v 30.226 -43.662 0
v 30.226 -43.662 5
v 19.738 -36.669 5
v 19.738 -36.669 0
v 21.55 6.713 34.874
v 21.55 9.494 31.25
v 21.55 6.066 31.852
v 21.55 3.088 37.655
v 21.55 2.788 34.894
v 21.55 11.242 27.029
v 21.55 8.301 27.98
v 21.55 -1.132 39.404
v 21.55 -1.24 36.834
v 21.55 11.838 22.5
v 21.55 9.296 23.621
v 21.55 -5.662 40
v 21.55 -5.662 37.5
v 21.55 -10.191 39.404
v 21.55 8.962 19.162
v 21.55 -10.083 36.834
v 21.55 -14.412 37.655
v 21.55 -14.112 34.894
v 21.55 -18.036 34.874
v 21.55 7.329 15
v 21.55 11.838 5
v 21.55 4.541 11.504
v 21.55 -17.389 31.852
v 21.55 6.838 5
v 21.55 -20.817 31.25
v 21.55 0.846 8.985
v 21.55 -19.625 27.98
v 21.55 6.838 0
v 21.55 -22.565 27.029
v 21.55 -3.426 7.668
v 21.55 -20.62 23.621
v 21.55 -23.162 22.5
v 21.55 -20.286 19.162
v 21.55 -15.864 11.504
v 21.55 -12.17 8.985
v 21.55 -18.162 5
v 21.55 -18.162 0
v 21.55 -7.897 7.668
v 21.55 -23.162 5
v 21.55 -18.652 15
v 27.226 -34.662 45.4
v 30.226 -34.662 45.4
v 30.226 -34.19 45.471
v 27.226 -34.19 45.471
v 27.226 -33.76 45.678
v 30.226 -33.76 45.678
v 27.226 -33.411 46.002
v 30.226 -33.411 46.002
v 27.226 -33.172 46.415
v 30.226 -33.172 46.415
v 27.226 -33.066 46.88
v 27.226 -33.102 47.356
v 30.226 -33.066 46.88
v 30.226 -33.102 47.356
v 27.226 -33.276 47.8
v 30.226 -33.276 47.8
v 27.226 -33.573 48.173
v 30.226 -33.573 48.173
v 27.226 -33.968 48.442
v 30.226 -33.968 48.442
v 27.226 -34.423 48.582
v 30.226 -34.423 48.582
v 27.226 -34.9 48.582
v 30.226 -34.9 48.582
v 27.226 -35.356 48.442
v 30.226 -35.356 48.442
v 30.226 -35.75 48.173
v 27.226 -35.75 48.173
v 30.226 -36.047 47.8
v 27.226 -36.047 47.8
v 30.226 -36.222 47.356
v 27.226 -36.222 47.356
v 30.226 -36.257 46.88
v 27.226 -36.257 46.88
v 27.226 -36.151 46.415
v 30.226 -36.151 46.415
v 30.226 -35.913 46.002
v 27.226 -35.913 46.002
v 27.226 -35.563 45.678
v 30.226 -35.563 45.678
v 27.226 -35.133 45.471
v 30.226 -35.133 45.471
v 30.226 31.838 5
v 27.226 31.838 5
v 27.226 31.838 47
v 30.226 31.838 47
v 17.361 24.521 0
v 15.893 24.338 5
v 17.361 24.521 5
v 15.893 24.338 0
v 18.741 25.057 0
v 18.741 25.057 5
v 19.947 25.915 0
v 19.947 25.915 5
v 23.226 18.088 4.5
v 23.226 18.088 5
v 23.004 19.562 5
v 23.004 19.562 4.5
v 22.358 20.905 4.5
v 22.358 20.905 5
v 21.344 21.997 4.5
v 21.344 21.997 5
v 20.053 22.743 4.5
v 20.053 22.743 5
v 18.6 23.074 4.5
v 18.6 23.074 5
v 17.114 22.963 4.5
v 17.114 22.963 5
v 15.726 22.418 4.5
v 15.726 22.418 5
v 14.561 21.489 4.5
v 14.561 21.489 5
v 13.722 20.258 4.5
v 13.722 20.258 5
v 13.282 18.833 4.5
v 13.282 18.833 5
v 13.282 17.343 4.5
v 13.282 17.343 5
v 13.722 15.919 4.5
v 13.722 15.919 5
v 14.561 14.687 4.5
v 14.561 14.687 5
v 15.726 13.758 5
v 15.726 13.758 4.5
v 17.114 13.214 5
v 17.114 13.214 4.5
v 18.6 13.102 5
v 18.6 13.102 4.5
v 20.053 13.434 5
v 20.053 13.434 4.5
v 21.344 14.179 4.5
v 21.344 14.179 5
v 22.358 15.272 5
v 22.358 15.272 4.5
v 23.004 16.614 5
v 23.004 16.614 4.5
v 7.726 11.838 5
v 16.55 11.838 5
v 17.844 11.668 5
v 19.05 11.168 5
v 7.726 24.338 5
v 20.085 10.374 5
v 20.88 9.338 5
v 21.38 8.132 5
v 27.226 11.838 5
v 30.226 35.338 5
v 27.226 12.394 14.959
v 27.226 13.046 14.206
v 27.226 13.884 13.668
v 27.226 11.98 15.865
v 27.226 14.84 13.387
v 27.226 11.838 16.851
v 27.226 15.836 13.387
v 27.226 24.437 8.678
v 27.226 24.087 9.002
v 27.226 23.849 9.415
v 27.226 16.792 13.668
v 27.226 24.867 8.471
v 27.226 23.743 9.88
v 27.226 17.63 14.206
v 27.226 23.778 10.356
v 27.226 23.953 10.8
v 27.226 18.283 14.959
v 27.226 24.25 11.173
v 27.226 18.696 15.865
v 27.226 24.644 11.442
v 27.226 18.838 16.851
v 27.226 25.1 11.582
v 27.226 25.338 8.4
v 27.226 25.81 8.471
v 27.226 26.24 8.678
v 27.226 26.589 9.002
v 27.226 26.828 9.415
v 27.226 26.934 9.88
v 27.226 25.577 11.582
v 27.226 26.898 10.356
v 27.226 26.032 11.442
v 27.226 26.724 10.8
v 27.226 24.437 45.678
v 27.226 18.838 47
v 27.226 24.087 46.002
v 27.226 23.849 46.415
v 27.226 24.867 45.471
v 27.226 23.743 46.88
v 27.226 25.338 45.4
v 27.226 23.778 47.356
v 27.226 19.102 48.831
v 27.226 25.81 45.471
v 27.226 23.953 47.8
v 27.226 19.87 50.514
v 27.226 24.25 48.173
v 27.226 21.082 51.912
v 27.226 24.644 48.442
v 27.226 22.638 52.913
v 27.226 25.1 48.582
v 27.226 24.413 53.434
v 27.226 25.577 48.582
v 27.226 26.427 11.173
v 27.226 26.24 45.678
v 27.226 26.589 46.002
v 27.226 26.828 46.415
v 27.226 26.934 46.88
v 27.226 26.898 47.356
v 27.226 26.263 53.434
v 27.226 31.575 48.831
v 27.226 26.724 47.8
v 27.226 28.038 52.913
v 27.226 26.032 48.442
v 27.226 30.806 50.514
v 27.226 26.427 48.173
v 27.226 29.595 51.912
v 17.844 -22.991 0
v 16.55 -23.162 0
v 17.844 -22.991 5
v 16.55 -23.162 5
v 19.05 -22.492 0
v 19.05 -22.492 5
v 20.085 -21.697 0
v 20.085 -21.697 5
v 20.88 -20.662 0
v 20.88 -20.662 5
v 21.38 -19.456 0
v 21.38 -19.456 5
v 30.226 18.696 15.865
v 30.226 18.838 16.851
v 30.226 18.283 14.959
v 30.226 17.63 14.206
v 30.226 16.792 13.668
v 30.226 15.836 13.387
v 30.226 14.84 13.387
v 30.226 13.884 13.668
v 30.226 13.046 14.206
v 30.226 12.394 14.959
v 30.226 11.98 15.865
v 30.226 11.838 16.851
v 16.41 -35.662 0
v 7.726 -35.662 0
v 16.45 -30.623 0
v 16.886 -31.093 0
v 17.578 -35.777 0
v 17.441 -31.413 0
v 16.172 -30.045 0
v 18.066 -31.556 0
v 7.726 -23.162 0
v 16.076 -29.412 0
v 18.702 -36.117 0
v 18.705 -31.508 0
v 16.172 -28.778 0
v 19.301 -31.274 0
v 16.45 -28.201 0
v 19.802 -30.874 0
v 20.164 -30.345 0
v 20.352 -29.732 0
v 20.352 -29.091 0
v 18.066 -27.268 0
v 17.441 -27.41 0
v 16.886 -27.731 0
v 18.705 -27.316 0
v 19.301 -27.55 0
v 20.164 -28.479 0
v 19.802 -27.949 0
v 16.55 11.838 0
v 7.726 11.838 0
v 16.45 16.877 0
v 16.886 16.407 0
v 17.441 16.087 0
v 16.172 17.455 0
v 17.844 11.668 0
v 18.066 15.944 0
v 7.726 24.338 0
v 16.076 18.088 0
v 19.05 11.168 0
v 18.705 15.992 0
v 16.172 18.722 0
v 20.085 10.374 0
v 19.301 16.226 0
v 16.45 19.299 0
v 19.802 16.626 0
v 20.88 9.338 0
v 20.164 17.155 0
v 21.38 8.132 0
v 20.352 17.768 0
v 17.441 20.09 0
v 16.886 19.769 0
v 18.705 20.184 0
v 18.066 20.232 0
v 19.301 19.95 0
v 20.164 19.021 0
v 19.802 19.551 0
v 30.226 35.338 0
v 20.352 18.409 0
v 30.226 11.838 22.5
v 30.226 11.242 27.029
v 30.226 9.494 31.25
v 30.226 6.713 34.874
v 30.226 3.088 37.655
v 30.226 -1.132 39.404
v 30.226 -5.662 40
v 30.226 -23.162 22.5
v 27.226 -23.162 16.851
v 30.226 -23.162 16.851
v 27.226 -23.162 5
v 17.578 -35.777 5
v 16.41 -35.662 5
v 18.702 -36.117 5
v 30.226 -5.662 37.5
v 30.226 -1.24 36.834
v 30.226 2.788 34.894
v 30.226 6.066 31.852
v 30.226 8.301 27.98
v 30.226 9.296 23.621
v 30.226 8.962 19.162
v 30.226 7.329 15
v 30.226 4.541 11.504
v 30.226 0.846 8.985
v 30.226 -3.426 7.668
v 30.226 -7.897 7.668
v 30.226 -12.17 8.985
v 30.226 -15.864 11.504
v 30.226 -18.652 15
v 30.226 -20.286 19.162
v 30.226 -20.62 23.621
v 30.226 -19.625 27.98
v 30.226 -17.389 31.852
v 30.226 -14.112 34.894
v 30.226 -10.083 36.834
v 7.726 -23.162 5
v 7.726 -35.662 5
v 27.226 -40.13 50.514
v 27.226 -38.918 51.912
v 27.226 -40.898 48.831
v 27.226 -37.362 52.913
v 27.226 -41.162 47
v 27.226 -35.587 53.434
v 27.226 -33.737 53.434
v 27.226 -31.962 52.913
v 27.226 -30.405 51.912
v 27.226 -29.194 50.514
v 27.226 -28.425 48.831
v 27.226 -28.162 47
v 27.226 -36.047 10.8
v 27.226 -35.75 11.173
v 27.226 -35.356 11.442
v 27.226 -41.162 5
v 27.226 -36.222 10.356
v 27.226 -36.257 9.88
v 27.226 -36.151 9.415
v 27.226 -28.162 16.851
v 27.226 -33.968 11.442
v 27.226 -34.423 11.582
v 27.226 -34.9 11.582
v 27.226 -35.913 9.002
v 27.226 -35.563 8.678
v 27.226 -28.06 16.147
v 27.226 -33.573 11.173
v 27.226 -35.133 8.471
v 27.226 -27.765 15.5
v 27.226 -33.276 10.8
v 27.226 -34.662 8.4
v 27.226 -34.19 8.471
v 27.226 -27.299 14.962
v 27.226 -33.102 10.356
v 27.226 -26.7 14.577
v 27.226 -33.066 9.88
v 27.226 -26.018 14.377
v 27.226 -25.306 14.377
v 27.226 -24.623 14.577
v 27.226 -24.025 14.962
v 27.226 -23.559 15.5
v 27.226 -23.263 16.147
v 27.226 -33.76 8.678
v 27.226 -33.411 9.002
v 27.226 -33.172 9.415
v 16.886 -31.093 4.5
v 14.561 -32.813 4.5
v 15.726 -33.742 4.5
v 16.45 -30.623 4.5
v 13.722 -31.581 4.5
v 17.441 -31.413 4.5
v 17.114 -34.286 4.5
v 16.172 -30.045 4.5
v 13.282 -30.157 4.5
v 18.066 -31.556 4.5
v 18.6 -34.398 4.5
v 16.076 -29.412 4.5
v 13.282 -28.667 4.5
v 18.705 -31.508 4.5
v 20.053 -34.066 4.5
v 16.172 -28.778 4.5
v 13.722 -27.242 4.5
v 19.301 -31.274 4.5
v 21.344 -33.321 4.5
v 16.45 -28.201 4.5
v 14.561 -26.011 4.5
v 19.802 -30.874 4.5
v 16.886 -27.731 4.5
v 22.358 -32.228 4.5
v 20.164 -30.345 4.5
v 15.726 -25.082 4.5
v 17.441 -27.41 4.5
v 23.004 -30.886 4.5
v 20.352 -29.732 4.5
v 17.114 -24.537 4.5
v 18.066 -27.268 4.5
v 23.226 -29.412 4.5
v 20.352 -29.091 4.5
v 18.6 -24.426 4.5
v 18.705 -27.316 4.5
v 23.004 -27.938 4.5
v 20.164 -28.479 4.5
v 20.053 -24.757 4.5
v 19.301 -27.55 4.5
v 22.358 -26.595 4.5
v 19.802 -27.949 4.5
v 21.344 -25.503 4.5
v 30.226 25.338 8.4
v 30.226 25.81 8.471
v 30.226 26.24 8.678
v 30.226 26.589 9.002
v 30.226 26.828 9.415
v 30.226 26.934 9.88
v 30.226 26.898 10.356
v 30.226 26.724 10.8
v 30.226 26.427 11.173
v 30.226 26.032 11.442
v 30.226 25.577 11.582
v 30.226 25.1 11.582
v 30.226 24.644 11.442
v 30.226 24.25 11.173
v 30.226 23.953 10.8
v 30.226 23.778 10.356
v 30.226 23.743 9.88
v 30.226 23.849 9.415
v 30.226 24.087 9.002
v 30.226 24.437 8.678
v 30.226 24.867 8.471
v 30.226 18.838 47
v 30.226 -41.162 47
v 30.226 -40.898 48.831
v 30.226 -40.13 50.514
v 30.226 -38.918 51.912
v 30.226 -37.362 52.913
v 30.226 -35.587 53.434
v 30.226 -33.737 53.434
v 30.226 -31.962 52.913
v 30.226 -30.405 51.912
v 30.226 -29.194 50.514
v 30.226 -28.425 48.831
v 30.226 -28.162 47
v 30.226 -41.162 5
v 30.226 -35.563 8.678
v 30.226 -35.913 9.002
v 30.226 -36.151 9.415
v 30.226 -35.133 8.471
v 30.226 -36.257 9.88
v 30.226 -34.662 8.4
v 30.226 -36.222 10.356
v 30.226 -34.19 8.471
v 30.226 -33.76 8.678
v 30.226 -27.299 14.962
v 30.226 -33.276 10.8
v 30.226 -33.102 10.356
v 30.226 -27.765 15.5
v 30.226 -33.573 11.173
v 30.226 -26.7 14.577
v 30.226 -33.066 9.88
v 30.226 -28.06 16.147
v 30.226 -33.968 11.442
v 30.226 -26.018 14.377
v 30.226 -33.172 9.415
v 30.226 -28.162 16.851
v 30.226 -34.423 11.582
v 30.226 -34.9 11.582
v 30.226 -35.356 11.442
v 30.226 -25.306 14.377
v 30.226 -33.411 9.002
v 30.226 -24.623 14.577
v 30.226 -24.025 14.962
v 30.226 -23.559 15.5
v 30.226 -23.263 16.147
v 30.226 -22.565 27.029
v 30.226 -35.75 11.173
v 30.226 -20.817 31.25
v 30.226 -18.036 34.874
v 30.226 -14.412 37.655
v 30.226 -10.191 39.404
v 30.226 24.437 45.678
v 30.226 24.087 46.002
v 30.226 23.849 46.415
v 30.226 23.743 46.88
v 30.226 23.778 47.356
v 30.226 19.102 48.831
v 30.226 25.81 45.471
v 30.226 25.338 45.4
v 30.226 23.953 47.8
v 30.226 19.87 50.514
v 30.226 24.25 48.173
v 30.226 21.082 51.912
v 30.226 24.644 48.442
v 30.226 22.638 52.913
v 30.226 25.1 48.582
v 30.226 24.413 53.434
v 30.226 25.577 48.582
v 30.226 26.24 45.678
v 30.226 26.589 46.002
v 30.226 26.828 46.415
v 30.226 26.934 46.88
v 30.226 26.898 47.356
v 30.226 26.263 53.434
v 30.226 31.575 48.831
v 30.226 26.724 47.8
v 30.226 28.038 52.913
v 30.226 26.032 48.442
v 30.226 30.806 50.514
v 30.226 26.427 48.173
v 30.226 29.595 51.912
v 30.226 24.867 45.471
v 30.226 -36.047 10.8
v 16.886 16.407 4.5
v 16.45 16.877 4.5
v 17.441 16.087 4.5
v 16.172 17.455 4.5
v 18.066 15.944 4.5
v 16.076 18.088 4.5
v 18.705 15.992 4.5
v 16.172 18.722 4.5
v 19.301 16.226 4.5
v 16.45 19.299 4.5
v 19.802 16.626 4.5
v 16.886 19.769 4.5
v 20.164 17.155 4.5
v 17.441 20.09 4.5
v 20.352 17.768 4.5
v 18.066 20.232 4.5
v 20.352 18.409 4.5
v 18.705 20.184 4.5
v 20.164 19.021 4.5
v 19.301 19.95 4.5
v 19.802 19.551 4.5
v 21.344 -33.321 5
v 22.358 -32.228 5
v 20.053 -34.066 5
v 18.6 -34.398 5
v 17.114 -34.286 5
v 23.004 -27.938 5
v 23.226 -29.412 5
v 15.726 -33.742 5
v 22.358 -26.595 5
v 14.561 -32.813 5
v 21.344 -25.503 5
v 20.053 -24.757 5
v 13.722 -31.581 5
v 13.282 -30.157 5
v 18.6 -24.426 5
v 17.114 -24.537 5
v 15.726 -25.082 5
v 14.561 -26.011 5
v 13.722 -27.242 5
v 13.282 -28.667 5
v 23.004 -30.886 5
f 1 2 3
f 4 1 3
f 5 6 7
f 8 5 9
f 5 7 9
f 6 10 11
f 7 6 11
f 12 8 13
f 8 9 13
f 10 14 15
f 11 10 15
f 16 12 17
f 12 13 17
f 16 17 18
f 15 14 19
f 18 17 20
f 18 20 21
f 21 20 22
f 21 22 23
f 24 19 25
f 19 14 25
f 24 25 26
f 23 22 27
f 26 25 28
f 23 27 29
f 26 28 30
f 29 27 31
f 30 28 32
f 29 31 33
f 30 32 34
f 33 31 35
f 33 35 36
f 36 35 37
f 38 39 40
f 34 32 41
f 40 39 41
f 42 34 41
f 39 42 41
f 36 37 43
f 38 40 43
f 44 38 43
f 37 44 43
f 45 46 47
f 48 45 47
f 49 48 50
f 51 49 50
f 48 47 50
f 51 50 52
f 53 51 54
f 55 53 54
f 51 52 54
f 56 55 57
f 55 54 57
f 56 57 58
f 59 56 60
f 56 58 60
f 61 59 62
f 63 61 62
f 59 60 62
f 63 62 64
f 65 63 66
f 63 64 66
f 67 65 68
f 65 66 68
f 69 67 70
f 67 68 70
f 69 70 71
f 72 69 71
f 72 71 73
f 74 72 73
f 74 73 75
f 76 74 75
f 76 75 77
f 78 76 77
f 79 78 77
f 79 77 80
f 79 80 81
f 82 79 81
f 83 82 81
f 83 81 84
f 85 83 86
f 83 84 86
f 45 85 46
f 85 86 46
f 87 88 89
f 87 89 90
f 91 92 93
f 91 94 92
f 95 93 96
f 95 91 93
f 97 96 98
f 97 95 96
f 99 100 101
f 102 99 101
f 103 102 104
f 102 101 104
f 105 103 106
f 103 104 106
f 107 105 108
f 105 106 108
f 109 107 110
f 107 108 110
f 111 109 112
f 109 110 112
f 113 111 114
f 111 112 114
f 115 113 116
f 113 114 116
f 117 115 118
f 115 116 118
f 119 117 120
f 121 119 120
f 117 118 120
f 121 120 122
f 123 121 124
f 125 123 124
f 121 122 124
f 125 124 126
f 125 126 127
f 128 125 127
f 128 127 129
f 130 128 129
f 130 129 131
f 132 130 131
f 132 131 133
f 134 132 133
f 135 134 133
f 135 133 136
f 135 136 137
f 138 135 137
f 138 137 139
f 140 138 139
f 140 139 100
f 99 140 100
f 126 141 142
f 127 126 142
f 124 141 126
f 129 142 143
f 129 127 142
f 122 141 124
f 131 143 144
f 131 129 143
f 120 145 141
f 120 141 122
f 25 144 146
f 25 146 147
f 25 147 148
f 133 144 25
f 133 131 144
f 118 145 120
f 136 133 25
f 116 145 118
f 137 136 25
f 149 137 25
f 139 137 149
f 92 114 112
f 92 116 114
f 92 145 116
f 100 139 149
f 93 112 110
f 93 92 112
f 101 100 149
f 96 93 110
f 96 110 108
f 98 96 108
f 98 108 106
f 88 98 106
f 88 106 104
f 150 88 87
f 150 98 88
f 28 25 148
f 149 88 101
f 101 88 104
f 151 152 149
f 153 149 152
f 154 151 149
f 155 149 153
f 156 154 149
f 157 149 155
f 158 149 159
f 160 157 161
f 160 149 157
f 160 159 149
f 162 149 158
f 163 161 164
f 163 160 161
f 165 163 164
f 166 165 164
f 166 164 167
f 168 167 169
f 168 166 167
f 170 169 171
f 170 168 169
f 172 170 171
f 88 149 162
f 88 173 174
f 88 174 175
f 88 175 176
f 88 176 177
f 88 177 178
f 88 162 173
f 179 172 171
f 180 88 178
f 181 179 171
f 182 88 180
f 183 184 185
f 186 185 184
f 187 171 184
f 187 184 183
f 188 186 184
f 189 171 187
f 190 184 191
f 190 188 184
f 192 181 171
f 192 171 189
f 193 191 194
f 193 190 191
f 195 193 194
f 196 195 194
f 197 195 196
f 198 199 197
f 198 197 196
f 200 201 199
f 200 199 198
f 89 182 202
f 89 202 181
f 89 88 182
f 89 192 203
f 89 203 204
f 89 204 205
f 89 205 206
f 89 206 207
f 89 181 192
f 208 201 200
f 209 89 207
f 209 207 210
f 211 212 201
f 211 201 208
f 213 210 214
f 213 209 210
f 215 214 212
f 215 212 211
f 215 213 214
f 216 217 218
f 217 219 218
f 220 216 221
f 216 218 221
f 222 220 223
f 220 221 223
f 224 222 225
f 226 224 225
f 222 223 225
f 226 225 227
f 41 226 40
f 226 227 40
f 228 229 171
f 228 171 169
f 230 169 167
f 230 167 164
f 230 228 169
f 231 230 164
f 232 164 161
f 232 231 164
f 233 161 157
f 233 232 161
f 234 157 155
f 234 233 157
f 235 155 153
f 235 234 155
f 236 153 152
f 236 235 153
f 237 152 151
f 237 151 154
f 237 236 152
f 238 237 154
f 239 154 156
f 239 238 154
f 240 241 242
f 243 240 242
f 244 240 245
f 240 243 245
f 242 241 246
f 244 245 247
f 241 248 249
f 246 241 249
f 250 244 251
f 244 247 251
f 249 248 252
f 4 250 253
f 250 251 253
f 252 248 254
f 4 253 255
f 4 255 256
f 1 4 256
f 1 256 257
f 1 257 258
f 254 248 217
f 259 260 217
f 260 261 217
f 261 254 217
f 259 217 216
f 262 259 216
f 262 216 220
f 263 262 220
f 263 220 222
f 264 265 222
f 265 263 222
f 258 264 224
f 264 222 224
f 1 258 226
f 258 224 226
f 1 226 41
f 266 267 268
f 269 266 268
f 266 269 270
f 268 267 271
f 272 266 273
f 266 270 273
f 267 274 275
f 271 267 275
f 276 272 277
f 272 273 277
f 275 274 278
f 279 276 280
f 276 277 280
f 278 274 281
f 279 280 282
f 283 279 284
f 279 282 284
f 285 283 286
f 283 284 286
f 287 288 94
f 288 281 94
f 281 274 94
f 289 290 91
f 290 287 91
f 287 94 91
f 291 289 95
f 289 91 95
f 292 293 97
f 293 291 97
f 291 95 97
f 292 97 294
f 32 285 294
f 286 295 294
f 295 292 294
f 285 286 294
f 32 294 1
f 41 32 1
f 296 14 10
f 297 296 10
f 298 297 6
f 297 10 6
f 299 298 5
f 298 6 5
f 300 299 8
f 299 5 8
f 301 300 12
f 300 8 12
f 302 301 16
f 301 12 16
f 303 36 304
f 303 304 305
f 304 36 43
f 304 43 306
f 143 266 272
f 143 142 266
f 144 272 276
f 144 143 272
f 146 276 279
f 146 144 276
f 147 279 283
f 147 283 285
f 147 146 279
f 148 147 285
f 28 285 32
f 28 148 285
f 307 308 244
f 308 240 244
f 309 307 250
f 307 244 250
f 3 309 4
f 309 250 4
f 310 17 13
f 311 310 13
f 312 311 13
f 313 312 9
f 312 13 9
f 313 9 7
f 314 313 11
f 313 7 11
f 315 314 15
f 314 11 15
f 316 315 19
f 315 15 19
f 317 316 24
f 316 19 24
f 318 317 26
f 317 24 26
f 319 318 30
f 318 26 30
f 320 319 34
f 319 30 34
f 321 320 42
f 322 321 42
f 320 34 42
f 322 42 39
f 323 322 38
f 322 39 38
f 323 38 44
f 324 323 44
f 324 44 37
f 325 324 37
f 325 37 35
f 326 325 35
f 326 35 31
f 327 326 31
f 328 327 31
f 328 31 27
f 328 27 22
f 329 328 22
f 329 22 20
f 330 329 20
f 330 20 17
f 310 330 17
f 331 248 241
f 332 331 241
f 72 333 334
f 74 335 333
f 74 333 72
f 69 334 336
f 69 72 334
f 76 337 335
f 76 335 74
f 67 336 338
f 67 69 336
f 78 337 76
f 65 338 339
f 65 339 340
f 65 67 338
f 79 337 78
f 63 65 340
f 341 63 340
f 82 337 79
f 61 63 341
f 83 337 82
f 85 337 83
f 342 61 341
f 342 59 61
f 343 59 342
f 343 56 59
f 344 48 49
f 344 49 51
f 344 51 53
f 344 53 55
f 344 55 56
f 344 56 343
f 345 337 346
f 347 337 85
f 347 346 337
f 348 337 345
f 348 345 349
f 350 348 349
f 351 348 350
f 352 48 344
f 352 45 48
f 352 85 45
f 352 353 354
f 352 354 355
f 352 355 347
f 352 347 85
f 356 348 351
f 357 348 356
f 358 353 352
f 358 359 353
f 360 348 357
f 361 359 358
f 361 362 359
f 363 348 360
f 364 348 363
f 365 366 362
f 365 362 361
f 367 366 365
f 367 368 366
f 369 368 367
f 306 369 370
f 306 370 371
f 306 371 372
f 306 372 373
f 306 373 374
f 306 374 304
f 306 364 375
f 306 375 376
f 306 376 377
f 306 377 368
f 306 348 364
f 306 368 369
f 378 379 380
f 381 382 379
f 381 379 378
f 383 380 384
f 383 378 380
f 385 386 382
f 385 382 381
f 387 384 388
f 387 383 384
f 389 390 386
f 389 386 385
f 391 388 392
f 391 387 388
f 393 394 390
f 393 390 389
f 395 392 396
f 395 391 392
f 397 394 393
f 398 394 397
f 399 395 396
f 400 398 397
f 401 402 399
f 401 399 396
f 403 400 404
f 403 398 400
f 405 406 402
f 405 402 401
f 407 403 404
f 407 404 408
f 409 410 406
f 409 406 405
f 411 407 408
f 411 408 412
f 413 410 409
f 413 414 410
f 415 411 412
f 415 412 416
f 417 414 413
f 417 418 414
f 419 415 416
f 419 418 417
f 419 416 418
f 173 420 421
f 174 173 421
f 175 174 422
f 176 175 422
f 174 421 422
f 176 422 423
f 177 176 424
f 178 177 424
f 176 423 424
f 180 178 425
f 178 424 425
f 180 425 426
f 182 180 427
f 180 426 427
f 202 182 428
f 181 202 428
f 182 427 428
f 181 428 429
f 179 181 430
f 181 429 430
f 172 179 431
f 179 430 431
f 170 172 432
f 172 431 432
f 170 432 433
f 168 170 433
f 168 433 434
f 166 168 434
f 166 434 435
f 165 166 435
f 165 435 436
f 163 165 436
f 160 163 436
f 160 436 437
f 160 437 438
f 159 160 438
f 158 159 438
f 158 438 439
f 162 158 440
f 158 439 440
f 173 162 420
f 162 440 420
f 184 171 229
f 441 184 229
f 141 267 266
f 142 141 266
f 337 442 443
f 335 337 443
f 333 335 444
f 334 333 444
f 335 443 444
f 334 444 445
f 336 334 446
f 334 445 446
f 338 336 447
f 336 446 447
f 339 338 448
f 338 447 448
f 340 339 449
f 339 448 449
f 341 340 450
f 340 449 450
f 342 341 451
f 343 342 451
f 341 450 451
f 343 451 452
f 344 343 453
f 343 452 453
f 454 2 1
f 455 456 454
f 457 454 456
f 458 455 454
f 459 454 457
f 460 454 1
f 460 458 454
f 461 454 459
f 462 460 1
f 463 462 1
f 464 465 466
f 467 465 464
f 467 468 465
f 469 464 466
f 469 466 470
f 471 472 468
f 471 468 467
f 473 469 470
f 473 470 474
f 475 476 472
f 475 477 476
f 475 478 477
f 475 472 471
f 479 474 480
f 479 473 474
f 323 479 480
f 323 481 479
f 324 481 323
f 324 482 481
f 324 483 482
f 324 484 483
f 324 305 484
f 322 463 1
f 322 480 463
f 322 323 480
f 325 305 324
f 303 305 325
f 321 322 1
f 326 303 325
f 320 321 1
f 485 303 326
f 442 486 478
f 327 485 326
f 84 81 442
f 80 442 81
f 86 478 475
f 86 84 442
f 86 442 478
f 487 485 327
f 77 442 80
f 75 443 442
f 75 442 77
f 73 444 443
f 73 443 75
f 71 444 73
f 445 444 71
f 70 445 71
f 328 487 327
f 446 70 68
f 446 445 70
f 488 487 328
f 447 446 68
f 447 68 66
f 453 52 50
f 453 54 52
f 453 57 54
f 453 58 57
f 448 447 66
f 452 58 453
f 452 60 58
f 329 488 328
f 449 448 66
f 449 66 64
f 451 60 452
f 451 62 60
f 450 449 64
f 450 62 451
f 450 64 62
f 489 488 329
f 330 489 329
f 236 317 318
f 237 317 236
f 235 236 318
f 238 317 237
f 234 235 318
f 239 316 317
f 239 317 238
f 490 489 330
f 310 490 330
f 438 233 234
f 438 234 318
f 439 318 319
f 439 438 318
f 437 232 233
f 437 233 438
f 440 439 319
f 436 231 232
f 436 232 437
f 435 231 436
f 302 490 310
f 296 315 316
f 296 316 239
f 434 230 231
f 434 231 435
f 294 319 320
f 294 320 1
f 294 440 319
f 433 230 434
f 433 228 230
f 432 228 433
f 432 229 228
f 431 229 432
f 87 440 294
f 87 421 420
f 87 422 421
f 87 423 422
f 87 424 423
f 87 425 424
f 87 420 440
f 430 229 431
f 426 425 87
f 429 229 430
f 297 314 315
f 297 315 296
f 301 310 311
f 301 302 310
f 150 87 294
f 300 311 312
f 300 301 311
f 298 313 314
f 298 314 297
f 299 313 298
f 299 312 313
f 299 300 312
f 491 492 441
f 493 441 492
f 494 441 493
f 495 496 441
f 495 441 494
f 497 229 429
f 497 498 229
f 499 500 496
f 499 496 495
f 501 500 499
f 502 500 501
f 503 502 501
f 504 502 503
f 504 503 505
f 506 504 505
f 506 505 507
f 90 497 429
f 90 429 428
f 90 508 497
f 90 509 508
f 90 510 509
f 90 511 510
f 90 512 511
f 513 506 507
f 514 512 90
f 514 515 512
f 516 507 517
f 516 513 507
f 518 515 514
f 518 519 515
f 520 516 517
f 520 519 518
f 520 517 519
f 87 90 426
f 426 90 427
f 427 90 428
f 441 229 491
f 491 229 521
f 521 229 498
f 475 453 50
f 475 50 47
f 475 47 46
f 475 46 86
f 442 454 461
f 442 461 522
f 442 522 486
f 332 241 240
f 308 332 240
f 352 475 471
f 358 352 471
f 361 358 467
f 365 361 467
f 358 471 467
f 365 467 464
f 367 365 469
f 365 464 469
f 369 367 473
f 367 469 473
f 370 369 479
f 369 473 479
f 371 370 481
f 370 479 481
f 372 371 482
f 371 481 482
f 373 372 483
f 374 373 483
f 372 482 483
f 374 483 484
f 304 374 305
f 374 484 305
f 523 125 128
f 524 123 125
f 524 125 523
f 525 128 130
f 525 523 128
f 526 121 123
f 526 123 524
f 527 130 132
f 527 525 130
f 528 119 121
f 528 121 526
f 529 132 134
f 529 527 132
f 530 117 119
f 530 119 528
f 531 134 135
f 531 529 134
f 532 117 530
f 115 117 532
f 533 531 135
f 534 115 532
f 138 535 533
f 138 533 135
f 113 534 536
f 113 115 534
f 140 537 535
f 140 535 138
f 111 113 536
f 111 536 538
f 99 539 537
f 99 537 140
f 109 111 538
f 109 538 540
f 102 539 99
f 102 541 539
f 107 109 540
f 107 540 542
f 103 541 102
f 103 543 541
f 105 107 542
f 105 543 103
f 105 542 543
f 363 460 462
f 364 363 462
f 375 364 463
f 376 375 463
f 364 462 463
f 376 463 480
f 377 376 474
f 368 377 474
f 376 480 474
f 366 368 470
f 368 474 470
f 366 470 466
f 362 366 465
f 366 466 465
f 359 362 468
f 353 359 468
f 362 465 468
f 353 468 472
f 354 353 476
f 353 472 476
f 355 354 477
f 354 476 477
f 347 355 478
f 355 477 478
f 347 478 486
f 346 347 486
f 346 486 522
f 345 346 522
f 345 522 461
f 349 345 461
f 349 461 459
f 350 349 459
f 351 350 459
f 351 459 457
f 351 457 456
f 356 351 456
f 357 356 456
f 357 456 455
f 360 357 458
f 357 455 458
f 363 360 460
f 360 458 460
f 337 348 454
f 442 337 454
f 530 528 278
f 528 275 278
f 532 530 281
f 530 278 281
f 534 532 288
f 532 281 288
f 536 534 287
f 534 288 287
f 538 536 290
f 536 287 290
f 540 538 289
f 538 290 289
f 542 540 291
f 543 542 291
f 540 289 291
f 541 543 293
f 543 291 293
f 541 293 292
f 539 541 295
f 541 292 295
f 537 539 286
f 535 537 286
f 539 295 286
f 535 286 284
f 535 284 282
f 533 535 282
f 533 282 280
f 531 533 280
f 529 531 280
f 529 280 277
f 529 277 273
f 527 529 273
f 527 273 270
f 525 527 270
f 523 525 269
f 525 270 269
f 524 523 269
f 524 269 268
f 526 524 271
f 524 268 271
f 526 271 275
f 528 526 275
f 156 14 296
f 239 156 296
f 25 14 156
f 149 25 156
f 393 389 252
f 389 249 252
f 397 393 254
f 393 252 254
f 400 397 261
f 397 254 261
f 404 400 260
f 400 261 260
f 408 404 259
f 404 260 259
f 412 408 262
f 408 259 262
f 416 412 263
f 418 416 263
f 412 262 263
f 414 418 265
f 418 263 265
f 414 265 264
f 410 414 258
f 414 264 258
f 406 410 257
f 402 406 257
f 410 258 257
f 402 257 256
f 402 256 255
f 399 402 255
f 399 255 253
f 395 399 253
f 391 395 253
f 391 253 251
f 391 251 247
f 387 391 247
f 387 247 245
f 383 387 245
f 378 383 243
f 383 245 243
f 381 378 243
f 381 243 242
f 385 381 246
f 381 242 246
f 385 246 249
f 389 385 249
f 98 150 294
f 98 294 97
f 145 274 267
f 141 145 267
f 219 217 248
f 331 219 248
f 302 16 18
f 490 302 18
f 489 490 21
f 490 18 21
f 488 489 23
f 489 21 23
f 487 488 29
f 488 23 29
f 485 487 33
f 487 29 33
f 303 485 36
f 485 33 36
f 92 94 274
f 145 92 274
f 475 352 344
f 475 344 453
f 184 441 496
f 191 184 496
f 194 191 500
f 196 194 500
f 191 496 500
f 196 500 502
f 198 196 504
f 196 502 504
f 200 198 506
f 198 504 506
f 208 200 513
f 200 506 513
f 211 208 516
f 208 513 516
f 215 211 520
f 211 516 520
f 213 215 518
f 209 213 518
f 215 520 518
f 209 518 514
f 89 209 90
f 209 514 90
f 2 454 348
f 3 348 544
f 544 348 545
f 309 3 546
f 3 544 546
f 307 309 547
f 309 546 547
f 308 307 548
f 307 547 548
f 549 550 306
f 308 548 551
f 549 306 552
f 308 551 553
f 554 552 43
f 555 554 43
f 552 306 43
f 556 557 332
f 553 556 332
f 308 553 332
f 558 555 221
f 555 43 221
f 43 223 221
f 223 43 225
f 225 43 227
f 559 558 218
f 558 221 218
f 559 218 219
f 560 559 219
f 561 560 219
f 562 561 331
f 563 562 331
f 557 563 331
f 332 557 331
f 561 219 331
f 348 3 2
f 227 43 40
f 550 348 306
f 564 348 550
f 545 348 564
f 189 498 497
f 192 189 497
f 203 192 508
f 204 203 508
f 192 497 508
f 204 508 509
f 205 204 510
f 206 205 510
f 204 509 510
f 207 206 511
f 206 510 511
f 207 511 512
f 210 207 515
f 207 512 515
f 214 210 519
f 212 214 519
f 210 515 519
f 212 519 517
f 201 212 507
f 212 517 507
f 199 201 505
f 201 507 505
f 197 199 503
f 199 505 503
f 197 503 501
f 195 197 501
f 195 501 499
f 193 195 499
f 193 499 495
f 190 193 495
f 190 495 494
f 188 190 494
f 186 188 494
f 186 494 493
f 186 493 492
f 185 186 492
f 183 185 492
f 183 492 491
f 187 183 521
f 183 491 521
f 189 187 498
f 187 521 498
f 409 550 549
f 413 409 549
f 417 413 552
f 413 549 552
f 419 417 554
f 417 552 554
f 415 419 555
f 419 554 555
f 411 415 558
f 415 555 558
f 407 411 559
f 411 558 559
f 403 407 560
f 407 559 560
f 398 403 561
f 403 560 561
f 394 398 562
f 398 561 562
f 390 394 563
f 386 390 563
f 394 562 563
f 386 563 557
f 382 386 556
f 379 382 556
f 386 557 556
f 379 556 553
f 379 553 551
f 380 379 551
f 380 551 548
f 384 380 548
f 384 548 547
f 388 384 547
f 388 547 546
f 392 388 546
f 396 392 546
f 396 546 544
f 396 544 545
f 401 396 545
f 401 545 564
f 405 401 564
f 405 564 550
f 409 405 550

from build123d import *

# Parameters (mm, degrees)
EXTRUDE_2_DEPTH                = 5
SKETCH_4_W                     = 8.676470589
SKETCH_4_H                     = 35
SKETCH_4_W_2                   = 8.676470588
EXTRUDE_15_DEPTH               = 35
CUT_EXTRUDE_1_DEPTH            = 45
SKETCH_6_R                     = 15
CUT_EXTRUDE_2_DEPTH            = 45
FILLET_1_R                     = 5
EXTRUDE_START                  = -1
SKETCH_7_R                     = 15
SKETCH_7_R_2                   = 13
EXTRUDE_16_DEPTH               = 1
SPLIT_BODIES_1_SURFACE_1_BACK  = 86
SPLIT_BODIES_1_SURFACE_1_DEPTH = 172
SPLIT_BODIES_1_SURFACE_2_BACK  = 86
SPLIT_BODIES_1_SURFACE_2_DEPTH = 172
SKETCH_17_W                    = 3
SKETCH_17_H                    = 13
EXTRUDE_20_DEPTH               = 42
HOLE_WIZARD_1_D                = 4.3
HOLE_WIZARD_1_DEPTH            = 5
HOLE_WIZARD_1_CBORE_D          = 10
HOLE_WIZARD_1_CBORE_DEPTH      = 0.5
HOLE_WIZARD_1_TIP              = 1.291850331
EXTRUDE_21_DEPTH               = 3
SKETCH_33_R                    = 1.6
CUT_EXTRUDE_3_DEPTH            = 3
EXTRUDE_22_DEPTH               = 5
FILLET_2_R                     = 6


with BuildPart() as part:
    # 草图2 → 凸台-拉伸2 (new body)
    with BuildSketch(Plane.XY):
        Polygon((7.726423565, 24.338235294), (-14.773576435, 24.338235294), (-14.773576435, -35.661764706), (7.726423565, -35.661764706), (7.726423565, -23.161764706), (-6.097105846, -23.161764706), (-6.097105846, 11.838235294), (7.726423565, 11.838235294), align=None)
        Polygon((30.226423565, 24.338235294), (7.726423565, 24.338235294), (7.726423565, 11.838235294), (21.549952977, 11.838235294), (21.549952977, -23.161764706), (7.726423565, -23.161764706), (7.726423565, -35.661764706), (30.226423565, -35.661764706), align=None)
    extrude(amount=EXTRUDE_2_DEPTH)

    # 草图4 → 凸台-拉伸15 (add)
    with BuildSketch(Plane.XY.offset(5)):
        with Locations((-10.435341141, -5.661764706)):
            Rectangle(SKETCH_4_W, SKETCH_4_H)
        with Locations((25.888188271, -5.661764706)):
            Rectangle(SKETCH_4_W_2, SKETCH_4_H)
    extrude(amount=EXTRUDE_15_DEPTH)

    # 草图5 → 切除-拉伸1 (cut)
    with BuildSketch(Plane.ZY.offset(14.773576435)):
        with BuildLine():
            Line((40, -23.161764706), (40, -5.661764706))
            ThreePointArc((40, -5.661764706), (34.874368671, -18.036133377), (22.5, -23.161764706))
            Line((22.5, -23.161764706), (40, -23.161764706))
        make_face()
        with BuildLine():
            ThreePointArc((22.5, 11.838235294), (34.874368671, 6.712603965), (40, -5.661764706))
            Line((40, -5.661764706), (40, 11.838235294))
            Line((40, 11.838235294), (22.5, 11.838235294))
        make_face()
    extrude(amount=-CUT_EXTRUDE_1_DEPTH, mode=Mode.SUBTRACT)

    # 草图6 → 切除-拉伸2 (cut)
    with BuildSketch(Plane.ZY.offset(14.773576435)):
        with Locations((22.5, -5.661764706)):
            Circle(SKETCH_6_R)
    extrude(amount=-CUT_EXTRUDE_2_DEPTH, mode=Mode.SUBTRACT)

    # 圆角1
    fillet_1_edges = [part.edges().sort_by_distance(p)[0] for p in [
        (-6.097105846, 11.838235294, 2.5),
        (-6.097105846, -23.161764706, 2.5),
        (21.549952977, -23.161764706, 2.5),
        (21.549952977, 11.838235294, 2.5),
    ]]
    fillet(fillet_1_edges, radius=FILLET_1_R)

    # 草图7 → 凸台-拉伸16 (add)
    with BuildSketch(Plane(origin=(-6.097105846, 0, 0), x_dir=(0, 0, -1), z_dir=(1, 0, 0)).offset(EXTRUDE_START)):
        with Locations(Location((-22.5, -5.661764706, 0), (0, 0, 180))):
            Circle(SKETCH_7_R)
        with Locations((-22.5, -5.661764706)):
            Circle(SKETCH_7_R_2, mode=Mode.SUBTRACT)
    extrude(amount=EXTRUDE_16_DEPTH)


with BuildPart() as body_2:
    # Split Bodies 1: the piece behind the surface
    add(part.part)
    # Split Bodies 1 surface: a surface, the sketch's curves swept straight by 172 mm
    with BuildLine(Plane.XY.offset(5).offset(-SPLIT_BODIES_1_SURFACE_1_BACK), mode=Mode.PRIVATE) as split_bodies_1_surface_1_path:
        Line((7.726423565, 24.338235294), (7.726423565, -35.661764706))
    split_bodies_1_surface_1 = Shell.extrude(split_bodies_1_surface_1_path.wire(), (0 * SPLIT_BODIES_1_SURFACE_1_DEPTH, 0 * SPLIT_BODIES_1_SURFACE_1_DEPTH, 1 * SPLIT_BODIES_1_SURFACE_1_DEPTH))
    split(bisect_by=split_bodies_1_surface_1, keep=Keep.BOTTOM)


with BuildPart() as part_1:
    add(part.part)

    # Split Bodies 1: split by a surface, the side it looks to stays
    # Split Bodies 1 surface: a surface, the sketch's curves swept straight by 172 mm
    with BuildLine(Plane.XY.offset(5).offset(-SPLIT_BODIES_1_SURFACE_2_BACK), mode=Mode.PRIVATE) as split_bodies_1_surface_2_path:
        Line((7.726423565, 24.338235294), (7.726423565, -35.661764706))
    split_bodies_1_surface_2 = Shell.extrude(split_bodies_1_surface_2_path.wire(), (0 * SPLIT_BODIES_1_SURFACE_2_DEPTH, 0 * SPLIT_BODIES_1_SURFACE_2_DEPTH, 1 * SPLIT_BODIES_1_SURFACE_2_DEPTH))
    split(bisect_by=split_bodies_1_surface_2, keep=Keep.TOP)

    # 草图17 → 凸台-拉伸20 (add)
    with BuildSketch(Plane.XY.offset(5)):
        with Locations((28.726423565, -34.661764706)):
            Rectangle(SKETCH_17_W, SKETCH_17_H)
        with Locations((28.726423565, 25.338235294)):
            Rectangle(SKETCH_17_W, SKETCH_17_H)
    extrude(amount=EXTRUDE_20_DEPTH)

    # 打孔尺寸(%根据六角头螺)栓 全螺纹的类型1
    with Locations(Plane(origin=(18.226423565, 18.088235294, 5), x_dir=(1, 0, 0), z_dir=(0, 0, 1))):
        with Locations((0, 0), (0, -47.5)):
            CounterBoreHole(HOLE_WIZARD_1_D / 2, HOLE_WIZARD_1_CBORE_D / 2, HOLE_WIZARD_1_CBORE_DEPTH, depth=HOLE_WIZARD_1_DEPTH)
            with Locations((0, 0, -(HOLE_WIZARD_1_DEPTH + HOLE_WIZARD_1_TIP / 2))):  # 118° drill point
                Cone(0, HOLE_WIZARD_1_D / 2, HOLE_WIZARD_1_TIP, mode=Mode.SUBTRACT)

    # 草图32 → 凸台-拉伸21 (add)
    with BuildSketch(Plane(origin=(30.226423565, 0, 0), x_dir=(0, 0, -1), z_dir=(1, 0, 0))):
        with BuildLine():
            Line((-47, 31.838235294), (-47, 18.838235294))
            ThreePointArc((-47, 18.838235294), (-53.5, 25.338235294), (-47, 31.838235294))
        make_face()
        with BuildLine():
            Line((-47, -28.161764706), (-47, -41.161764706))
            ThreePointArc((-47, -41.161764706), (-53.5, -34.661764706), (-47, -28.161764706))
        make_face()
        with BuildLine():
            Line((-16.851482017, 11.838235294), (-5, 11.838235294))
            Line((-5, 11.838235294), (-5, 18.838235294))
            Line((-5, 18.838235294), (-16.851482017, 18.838235294))
            ThreePointArc((-16.851482017, 18.838235294), (-13.351482017, 15.338235294), (-16.851482017, 11.838235294))
        make_face()
        with BuildLine():
            Line((-16.851482017, -23.161764706), (-5, -23.161764706))
            Line((-5, -23.161764706), (-5, -28.161764706))
            Line((-5, -28.161764706), (-16.851482017, -28.161764706))
            ThreePointArc((-16.851482017, -28.161764706), (-14.351482017, -25.661764706), (-16.851482017, -23.161764706))
        make_face()
    extrude(amount=-EXTRUDE_21_DEPTH)

    # 草图33 → 切除-拉伸3 (cut)
    with BuildSketch(Plane(origin=(30.226423565, 0, 0), x_dir=(0, 0, -1), z_dir=(1, 0, 0))):
        with Locations((-47, 25.338235294)):
            Circle(SKETCH_33_R)
        with Locations((-47, -34.661764706)):
            Circle(SKETCH_33_R)
        with Locations((-10, 25.338235294)):
            Circle(SKETCH_33_R)
        with Locations((-10, -34.661764706)):
            Circle(SKETCH_33_R)
    extrude(amount=-CUT_EXTRUDE_3_DEPTH, mode=Mode.SUBTRACT)

    # 草图34 → 凸台-拉伸22 (add)
    with BuildSketch(Plane.XY.offset(5)):
        Polygon((18.226423565, 24.338235294), (30.226423565, 24.338235294), (30.226423565, 35.338235294), align=None)
        Polygon((18.226423565, -35.661764706), (30.226423565, -35.661764706), (30.226423565, -43.661764706), align=None)
    extrude(amount=-EXTRUDE_22_DEPTH)

    # 圆角2
    fillet_2_edges = [part_1.edges().sort_by_distance(p)[0] for p in [
        (18.226423565, 24.338235294, 2.5),
        (18.226423565, -35.661764706, 2.5),
    ]]
    fillet(fillet_2_edges, radius=FILLET_2_R)


solid = part_1.part
